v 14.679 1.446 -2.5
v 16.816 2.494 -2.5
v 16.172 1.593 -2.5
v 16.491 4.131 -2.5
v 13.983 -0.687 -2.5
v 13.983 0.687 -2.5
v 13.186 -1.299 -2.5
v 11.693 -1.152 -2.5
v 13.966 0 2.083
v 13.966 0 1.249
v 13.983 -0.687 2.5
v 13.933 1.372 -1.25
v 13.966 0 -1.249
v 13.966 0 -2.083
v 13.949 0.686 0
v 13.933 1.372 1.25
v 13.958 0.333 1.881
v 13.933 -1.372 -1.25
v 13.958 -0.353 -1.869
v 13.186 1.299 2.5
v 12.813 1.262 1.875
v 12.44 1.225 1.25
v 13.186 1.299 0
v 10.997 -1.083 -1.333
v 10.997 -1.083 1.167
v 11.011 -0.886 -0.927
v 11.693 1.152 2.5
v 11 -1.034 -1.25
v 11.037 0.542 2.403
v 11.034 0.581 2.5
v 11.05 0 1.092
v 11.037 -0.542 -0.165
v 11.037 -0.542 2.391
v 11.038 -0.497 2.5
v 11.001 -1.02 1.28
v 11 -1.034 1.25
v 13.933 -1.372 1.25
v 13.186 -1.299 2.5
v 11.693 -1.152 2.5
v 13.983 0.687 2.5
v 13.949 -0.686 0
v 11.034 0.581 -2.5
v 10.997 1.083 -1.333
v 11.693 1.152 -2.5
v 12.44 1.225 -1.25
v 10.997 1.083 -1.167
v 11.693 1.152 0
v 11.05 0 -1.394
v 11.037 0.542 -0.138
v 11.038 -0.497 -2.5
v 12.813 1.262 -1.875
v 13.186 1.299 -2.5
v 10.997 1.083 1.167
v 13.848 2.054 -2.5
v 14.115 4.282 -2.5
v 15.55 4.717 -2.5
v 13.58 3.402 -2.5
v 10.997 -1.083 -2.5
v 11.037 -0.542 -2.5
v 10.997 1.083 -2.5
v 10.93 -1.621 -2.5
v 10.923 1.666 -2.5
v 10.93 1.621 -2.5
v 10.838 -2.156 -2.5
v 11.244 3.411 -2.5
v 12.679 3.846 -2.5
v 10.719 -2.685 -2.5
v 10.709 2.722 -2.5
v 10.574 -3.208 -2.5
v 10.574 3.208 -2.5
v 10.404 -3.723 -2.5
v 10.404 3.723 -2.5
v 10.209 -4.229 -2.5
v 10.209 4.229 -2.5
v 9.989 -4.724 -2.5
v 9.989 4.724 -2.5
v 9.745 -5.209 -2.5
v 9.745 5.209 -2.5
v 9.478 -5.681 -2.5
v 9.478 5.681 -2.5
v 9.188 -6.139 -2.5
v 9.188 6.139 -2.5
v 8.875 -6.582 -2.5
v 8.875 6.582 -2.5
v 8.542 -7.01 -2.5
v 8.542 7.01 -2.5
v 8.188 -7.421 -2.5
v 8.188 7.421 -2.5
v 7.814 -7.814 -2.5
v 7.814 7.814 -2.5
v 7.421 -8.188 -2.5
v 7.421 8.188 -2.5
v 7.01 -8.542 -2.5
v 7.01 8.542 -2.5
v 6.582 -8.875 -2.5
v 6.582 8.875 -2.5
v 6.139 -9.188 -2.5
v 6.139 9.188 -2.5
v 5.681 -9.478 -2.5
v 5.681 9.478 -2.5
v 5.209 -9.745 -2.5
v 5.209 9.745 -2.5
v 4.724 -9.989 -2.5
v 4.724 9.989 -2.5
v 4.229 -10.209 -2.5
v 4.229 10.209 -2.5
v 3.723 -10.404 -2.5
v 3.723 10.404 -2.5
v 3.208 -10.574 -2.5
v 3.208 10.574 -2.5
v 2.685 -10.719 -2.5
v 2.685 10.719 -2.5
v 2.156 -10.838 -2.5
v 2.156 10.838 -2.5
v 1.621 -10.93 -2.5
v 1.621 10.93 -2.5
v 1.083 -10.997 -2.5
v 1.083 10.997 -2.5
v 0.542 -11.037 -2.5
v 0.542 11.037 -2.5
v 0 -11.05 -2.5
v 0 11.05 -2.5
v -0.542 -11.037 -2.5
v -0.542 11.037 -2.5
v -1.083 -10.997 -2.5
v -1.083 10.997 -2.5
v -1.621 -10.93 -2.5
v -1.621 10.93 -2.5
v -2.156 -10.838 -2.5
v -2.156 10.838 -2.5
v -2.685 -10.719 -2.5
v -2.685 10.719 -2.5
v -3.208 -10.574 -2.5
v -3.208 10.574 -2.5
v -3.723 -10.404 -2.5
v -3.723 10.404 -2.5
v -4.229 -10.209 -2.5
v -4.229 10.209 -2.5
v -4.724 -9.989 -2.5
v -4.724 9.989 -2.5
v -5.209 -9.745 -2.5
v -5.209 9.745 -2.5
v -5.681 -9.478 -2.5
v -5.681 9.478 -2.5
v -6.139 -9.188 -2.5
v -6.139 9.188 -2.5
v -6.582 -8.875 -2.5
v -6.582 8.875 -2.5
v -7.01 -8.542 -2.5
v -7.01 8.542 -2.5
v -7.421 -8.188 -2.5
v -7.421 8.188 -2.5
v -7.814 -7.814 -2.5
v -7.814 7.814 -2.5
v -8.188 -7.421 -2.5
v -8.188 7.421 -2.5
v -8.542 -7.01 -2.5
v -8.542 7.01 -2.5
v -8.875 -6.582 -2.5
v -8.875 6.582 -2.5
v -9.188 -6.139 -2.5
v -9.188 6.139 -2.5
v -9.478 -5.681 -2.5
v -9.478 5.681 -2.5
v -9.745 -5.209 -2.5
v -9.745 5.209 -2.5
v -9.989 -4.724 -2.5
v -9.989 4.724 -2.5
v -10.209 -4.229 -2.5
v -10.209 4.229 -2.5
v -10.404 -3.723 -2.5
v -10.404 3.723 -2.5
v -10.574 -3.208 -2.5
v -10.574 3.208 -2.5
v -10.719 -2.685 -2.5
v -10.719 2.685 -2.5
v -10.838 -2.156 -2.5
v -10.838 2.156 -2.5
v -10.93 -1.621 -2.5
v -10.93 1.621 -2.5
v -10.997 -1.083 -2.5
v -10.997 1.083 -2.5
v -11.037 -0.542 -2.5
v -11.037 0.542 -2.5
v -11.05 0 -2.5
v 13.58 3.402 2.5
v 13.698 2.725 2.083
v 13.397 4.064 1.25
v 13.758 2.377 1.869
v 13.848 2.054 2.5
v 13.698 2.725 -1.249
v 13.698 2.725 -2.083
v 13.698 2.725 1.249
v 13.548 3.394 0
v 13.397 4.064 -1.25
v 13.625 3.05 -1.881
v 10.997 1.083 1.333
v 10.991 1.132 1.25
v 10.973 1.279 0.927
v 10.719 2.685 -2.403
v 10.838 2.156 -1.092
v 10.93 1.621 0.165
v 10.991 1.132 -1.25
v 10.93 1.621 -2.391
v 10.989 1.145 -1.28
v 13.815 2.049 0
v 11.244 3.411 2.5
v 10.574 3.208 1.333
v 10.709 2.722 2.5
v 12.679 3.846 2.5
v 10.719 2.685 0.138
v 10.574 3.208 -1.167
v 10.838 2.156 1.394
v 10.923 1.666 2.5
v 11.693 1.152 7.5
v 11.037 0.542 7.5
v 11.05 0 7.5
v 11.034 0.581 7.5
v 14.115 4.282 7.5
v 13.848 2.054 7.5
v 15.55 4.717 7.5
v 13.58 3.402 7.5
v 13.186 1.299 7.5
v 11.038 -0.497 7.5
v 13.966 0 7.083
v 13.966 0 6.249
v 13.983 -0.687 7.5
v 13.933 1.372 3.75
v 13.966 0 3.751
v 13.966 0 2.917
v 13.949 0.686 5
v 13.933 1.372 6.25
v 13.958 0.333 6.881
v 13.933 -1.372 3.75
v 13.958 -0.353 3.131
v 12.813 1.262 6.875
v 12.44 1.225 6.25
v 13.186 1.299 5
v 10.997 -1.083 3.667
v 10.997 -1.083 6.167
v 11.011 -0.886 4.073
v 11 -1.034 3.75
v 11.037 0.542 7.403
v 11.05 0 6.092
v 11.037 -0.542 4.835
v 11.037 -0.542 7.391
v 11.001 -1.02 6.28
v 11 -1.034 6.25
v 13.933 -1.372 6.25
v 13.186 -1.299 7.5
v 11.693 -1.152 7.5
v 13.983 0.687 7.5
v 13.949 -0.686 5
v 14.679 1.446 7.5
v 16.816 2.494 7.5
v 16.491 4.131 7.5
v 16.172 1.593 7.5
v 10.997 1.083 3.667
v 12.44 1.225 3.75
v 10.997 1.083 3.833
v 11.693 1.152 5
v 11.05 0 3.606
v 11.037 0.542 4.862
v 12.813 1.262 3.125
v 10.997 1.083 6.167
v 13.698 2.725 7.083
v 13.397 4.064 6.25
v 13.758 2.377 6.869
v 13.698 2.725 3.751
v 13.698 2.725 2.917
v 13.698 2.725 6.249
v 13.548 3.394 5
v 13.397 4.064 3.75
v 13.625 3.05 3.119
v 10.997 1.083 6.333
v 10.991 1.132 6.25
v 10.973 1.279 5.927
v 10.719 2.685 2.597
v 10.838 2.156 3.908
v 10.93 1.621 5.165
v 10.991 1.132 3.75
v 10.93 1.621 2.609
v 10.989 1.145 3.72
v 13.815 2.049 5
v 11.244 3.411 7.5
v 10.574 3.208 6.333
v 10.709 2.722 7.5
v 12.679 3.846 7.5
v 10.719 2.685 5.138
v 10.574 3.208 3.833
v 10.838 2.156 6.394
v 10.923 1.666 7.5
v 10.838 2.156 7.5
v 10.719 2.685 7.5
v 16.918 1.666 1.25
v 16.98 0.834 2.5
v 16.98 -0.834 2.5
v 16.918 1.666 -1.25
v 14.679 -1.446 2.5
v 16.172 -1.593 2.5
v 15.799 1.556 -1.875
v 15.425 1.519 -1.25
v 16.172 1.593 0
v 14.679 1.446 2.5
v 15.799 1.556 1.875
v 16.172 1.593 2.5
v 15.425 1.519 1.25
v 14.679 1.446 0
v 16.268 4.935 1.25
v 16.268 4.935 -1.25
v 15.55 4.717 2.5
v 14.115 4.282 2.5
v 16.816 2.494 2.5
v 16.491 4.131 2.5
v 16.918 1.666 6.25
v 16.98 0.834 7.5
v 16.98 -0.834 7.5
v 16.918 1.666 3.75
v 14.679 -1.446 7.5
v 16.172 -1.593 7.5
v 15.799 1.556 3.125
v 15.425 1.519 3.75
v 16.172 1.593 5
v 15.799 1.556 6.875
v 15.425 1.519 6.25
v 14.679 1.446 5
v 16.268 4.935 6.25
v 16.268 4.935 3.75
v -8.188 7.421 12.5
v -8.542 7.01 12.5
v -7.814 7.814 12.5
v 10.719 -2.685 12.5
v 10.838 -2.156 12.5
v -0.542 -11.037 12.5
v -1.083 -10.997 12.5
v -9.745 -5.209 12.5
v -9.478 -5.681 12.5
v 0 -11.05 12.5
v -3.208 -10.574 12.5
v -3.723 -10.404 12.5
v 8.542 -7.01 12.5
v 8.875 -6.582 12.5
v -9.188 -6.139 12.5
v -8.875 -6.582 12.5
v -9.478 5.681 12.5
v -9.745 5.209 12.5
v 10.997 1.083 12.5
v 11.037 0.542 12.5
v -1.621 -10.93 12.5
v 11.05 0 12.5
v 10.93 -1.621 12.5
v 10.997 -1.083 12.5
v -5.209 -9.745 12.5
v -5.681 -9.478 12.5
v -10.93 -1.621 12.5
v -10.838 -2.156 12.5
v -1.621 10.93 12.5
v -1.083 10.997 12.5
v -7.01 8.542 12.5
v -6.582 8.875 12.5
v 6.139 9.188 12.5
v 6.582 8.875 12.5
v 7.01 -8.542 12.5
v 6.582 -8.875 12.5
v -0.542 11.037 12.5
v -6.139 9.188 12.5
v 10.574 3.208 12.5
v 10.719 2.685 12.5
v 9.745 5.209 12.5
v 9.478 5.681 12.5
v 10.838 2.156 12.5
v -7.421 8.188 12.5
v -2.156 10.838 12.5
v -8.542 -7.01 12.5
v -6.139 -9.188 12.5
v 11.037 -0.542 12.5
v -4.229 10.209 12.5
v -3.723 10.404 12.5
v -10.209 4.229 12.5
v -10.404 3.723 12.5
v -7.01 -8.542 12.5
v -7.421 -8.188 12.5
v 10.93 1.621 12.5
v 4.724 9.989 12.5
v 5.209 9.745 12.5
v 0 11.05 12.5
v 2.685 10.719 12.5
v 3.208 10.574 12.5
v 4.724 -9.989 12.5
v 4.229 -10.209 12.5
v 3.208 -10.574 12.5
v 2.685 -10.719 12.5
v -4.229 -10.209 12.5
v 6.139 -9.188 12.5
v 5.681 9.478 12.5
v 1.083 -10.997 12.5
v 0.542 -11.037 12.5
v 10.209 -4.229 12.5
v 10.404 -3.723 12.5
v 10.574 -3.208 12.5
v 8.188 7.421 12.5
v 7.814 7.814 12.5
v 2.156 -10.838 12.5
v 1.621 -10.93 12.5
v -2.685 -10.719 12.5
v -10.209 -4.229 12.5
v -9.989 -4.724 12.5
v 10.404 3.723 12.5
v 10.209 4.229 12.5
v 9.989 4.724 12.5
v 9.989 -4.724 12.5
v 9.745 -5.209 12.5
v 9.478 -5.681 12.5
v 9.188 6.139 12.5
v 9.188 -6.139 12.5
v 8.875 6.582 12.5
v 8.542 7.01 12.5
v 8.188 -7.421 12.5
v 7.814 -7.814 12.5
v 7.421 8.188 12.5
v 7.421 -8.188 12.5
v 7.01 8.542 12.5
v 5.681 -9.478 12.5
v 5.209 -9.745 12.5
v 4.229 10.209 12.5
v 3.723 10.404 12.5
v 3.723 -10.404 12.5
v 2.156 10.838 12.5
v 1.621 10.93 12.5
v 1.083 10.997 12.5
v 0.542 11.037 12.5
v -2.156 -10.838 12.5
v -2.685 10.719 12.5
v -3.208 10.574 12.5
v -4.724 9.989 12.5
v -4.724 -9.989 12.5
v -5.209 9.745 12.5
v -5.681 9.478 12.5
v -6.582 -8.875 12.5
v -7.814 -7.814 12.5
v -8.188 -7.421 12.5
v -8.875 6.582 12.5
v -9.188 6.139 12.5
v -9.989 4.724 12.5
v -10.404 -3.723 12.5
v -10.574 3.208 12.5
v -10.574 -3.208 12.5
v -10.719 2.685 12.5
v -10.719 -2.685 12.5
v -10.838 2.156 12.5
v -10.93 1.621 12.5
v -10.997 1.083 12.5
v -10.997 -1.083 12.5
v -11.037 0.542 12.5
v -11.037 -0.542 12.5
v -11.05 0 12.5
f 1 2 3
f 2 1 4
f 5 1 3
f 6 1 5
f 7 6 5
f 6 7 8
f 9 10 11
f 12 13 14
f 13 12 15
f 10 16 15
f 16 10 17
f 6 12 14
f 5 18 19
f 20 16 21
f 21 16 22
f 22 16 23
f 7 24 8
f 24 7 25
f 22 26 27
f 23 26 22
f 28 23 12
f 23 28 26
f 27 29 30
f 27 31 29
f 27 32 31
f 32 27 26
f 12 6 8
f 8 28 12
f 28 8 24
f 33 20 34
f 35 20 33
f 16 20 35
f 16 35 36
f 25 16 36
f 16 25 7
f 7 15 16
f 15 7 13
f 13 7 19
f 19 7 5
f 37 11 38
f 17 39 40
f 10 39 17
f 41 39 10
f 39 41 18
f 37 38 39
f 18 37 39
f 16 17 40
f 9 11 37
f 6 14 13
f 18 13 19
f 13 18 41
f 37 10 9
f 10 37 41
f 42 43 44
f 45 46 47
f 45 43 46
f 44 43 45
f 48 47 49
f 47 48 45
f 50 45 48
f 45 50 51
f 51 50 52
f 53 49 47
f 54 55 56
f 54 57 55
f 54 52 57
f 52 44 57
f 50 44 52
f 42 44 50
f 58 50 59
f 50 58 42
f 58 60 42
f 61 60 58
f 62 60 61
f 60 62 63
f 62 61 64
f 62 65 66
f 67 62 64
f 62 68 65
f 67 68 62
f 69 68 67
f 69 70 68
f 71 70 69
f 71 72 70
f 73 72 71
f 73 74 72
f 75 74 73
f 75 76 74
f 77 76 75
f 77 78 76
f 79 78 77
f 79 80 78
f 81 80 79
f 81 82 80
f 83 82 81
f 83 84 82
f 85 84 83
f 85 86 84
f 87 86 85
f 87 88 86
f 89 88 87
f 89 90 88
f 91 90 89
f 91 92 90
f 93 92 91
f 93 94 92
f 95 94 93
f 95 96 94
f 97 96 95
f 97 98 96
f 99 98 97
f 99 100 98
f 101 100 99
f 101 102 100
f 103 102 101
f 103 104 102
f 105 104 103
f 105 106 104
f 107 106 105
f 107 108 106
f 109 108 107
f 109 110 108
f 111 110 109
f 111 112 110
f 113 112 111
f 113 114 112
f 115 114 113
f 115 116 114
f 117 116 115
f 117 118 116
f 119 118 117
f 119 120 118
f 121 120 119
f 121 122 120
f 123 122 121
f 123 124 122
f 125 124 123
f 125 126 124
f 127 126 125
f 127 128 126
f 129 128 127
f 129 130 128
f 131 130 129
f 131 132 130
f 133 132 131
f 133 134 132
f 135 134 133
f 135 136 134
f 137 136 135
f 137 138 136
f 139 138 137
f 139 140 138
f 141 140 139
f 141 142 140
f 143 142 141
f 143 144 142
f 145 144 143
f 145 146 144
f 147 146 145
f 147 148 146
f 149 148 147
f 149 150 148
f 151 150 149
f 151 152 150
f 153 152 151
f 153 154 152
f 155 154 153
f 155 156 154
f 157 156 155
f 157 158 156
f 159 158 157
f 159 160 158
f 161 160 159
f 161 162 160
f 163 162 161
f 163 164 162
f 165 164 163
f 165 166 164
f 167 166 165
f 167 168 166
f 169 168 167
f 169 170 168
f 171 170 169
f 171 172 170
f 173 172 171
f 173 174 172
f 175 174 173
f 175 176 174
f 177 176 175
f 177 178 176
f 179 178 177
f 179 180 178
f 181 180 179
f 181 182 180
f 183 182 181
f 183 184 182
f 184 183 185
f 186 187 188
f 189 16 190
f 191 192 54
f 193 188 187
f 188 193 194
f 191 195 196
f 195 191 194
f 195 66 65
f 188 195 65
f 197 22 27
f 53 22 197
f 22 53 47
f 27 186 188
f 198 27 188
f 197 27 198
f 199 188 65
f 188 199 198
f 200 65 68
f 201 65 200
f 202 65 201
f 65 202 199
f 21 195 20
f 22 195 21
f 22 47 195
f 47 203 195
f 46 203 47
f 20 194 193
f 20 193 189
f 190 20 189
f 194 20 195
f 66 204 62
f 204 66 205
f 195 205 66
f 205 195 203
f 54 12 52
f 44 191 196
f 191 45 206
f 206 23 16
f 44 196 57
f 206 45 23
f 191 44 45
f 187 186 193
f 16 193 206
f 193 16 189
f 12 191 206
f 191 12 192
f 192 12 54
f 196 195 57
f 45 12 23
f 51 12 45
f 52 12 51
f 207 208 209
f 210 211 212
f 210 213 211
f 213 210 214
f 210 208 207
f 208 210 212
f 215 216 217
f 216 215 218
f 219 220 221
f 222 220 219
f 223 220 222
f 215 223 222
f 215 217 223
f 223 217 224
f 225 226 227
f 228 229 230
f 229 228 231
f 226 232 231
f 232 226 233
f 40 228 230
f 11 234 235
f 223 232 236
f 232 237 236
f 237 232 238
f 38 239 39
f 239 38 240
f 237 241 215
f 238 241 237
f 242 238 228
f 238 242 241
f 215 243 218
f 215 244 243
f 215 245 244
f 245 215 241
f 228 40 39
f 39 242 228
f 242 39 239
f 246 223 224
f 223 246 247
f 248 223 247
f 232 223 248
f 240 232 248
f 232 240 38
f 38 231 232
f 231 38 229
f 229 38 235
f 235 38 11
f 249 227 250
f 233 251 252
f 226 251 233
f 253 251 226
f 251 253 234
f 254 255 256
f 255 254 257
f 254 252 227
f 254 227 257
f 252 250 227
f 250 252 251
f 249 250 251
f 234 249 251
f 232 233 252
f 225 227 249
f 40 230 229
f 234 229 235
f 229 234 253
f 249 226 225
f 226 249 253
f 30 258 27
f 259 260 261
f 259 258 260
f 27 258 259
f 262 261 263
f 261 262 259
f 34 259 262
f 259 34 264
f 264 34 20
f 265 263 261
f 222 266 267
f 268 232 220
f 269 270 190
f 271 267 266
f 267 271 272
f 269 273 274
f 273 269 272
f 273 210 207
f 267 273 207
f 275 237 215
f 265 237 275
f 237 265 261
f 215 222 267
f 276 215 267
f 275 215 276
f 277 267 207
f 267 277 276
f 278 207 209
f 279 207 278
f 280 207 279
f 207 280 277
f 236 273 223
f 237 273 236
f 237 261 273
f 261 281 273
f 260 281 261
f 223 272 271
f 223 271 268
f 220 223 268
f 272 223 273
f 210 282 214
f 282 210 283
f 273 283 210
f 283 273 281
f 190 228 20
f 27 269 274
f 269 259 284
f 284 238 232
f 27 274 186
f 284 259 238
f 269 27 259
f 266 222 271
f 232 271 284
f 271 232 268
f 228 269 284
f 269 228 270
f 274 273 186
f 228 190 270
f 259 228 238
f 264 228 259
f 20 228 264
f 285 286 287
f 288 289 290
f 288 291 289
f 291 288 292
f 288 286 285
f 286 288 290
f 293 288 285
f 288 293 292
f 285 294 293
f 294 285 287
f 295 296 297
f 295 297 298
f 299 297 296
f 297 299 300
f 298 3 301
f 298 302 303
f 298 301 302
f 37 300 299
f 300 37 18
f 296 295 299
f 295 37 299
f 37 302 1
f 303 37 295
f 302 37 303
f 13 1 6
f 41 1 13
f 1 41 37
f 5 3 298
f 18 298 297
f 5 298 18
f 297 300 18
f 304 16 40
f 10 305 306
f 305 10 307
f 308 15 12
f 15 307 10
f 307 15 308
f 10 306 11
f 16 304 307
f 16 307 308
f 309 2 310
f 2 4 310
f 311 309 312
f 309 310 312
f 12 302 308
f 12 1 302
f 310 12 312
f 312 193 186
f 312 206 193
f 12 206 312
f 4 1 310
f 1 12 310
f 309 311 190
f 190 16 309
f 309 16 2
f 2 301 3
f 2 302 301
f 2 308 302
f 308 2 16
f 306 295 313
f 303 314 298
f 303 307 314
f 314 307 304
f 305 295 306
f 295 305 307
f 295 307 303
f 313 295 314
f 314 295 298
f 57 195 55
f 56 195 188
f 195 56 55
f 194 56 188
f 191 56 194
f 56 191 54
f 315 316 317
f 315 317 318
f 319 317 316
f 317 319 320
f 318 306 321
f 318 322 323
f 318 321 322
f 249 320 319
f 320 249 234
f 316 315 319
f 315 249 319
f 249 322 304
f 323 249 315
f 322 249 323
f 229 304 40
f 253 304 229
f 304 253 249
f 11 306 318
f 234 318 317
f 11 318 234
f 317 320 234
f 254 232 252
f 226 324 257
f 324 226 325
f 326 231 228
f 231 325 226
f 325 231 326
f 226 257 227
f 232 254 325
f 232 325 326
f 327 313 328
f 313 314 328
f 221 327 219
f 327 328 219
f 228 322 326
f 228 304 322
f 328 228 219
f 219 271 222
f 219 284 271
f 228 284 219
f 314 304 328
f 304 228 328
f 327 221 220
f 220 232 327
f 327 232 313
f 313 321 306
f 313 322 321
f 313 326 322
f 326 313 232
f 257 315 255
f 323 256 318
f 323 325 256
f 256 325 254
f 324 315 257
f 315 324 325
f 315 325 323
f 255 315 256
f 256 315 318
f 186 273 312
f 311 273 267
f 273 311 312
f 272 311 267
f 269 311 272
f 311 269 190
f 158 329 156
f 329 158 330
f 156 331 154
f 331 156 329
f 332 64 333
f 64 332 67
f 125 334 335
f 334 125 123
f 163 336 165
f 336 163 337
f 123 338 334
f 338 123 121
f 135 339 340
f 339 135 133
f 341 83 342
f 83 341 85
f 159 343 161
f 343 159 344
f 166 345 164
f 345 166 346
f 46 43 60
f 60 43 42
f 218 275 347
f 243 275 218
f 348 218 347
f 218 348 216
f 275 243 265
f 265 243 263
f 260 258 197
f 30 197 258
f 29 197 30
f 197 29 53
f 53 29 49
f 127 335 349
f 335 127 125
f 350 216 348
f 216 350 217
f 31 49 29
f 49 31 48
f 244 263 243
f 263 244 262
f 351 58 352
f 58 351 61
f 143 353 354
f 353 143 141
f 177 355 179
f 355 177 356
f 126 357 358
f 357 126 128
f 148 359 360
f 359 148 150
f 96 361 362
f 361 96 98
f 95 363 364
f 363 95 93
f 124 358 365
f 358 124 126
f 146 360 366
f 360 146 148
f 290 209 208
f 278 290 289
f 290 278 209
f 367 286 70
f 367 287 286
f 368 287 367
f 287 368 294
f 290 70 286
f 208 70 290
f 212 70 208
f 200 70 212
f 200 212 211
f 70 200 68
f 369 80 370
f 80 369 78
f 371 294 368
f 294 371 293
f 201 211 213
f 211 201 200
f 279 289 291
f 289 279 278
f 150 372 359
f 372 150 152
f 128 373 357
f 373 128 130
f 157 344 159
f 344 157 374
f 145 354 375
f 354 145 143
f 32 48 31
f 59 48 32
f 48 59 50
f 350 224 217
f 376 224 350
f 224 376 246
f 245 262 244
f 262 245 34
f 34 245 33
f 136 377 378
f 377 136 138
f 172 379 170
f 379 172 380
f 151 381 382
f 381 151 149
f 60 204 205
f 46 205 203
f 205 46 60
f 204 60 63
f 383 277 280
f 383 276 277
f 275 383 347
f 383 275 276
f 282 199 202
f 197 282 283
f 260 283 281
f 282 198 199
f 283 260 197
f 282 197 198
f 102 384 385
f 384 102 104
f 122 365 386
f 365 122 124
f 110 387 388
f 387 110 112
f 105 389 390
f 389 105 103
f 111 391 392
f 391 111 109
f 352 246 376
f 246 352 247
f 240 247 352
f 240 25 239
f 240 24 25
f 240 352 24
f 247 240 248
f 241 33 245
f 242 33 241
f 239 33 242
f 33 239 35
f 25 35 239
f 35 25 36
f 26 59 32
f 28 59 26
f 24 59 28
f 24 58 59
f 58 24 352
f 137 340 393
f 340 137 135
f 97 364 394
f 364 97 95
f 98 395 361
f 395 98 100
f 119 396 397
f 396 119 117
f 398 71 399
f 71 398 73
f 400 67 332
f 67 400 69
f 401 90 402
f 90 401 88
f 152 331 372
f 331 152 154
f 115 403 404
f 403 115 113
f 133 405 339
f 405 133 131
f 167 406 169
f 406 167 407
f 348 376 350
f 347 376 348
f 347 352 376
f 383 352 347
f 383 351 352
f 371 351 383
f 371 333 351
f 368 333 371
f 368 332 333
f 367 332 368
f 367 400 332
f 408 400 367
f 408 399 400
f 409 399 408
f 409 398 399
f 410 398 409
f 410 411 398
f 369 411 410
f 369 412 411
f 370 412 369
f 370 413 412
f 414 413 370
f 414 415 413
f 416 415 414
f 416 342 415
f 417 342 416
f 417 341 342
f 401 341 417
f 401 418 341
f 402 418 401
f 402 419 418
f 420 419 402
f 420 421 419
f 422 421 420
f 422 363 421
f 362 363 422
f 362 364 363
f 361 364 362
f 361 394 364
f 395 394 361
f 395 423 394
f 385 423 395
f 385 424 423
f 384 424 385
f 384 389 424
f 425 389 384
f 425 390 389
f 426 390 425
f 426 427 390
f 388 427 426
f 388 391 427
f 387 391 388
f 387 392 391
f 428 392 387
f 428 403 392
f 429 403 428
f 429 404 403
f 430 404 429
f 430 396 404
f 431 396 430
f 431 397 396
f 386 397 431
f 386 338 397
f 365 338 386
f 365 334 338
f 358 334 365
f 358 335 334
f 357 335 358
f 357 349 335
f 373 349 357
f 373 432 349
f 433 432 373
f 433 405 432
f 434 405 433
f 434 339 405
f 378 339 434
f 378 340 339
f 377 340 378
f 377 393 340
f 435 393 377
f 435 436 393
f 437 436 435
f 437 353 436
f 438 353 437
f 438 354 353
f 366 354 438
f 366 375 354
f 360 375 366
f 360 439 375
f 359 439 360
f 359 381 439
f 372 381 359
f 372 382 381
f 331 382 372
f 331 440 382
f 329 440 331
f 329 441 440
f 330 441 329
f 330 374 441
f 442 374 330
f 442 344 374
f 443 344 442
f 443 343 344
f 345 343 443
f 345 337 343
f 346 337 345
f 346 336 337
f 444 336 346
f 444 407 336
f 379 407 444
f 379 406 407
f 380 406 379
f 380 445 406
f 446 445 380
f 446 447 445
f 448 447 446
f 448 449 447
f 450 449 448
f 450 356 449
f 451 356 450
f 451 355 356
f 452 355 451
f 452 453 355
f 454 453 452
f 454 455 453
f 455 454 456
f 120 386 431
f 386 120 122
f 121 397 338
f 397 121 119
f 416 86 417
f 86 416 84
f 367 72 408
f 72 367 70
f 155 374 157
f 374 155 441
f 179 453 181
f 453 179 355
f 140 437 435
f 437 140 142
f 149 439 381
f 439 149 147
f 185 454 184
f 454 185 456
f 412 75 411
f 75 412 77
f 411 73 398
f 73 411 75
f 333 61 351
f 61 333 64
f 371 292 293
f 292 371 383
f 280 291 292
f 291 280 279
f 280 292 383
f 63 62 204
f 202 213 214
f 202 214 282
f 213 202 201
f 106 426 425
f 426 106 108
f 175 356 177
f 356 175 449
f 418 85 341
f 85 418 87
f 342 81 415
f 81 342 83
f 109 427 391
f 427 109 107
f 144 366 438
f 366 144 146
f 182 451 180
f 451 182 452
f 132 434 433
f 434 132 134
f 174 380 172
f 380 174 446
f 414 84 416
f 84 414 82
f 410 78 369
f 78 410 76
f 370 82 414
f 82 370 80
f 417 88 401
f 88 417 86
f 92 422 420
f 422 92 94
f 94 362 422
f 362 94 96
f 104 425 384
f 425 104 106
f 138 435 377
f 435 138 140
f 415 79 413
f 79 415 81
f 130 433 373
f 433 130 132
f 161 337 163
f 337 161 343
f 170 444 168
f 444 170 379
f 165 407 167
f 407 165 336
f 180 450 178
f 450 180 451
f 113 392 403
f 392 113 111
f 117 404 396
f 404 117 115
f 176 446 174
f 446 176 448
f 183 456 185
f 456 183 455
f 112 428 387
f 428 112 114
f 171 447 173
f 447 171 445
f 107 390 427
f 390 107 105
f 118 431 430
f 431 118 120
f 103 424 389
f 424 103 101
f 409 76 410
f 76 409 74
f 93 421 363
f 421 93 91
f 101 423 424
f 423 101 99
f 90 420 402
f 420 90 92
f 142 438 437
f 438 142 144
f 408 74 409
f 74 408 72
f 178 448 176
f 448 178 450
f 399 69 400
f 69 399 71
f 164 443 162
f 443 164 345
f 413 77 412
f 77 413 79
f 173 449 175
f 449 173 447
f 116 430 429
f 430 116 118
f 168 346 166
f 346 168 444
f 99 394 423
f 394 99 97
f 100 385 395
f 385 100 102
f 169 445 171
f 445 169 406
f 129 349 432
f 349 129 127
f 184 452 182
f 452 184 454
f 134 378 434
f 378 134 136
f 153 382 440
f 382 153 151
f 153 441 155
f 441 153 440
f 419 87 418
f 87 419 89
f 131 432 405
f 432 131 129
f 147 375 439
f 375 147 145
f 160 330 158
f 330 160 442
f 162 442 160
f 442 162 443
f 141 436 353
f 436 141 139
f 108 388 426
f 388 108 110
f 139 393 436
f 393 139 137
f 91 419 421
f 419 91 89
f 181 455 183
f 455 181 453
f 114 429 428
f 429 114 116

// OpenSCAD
//Reimplementation of Hatch Flow pattern for OpenSCAD
//Generalized for multiple layers of depth
//Added regularity as an alternative to randomness

nhor=32;
nvert=3;
hvert=15;
ndepth=2;
od=34;
id=22; 

module element(f,od,id,h,rotated=false) {
  assert(!is_undef(f));
  assert(!is_undef(od));
  assert(!is_undef(id));
  assert(!is_undef(h));
  assert(!is_undef(rotated));
  mp=(od+id)/4;
  q=(od-id)/8;
  p1=[[-1,-2,-2],[1,-2,-2],[2,-1,-2],[2,1,-2], //z=-2
     [-2,1,2],[-2,-1,2],[-2,-2,1],[-2,-2,-1], //x=-2
     [1,2,2],[-1,2,2],[2,2,-1],[2,2,1]];//y=2
  p2=[[1,-2,2],[2,-2,1],[2,-1,2],[-1,-2,2],[2,-2,-1],[2,1,2]];
  p3=[[-1,2,-2],[-2,2,-1],[-2,1,-2],[1,2,-2],[-2,2,1],[-2,-1,-2]];
  function rot(pts)= [for (p=pts) [p[2],p[1],-p[0]]];
  function bend(pts,mp,q,f) =[for (p=pts) [(mp+q*p[0])*cos(p[1]*90/f),(mp+q*p[0])*sin(p[1]*90/f),h*p[2]/4]];
  polyhedron(points=bend(rotated?rot(p1):p1,mp,q,f),
              faces=[[0,1,2,3], [9,8,5,4], //same z
                     [4,5,6,7], [11,10,3,2], //same x
                     [8,9,10,11], [7,6,1,0], //same y
                     [0,3,10,9,4,7], [2,1,6,5,8,11]]);
  polyhedron(points=bend(rotated?rot(p2):p2,mp,q,f),
              faces=[[0,2,1],[3,4,5],[0,3,5,2],[0,1,4,3],[1,2,5,4]]);
  polyhedron(points=bend(rotated?rot(p3):p3,mp,q,f),
              faces=[[0,1,2],[3,5,4],[2,5,3,0],[3,4,1,0],[4,5,2,1]]);
} 

module ring(nhor=16,nvert=3,hvert=6,ndepth=1,od=60,id=50) {
  randoms=rands(0,2,nhor*nvert*ndepth);
  //rotations=[for (r=randoms) r>1]; 
  //rotations=[for (i=[0:1:nhor*nvert*ndepth]) i%2==0 ];
  //rotations=[for (i=[0:1:nhor*nvert*ndepth-1]) i%3==0 ];
  rotations=[for (i=[0:1:nhor*nvert*ndepth-1]) i%5>2 ];
  echo(rotations);
  p=[for (k=[id:(od-id)/ndepth:od-(od-id)/ndepth])
      for (j=[0:hvert/nvert:hvert*(1-1/nvert)])
        for (i=[0:360/nhor:360-360/nhor])
          [i,j,nhor,k+(od-id)/ndepth,k,hvert/nvert]];
  for (i=[0:1:nhor*nvert*ndepth-1])
    rotate([0,0,p[i][0]]) translate([0,0,p[i][1]]) element(p[i][2],p[i][3],p[i][4],p[i][5],rotations[i]);
  translate([0,0,-hvert/(2*nvert)])cylinder(h=hvert,d=id+0.1,$fn=nhor*4);
}

module test_tile(nhor=16,nvert=3,hvert=6,ndepth=1,od=60,id=50) {
  randoms=rands(0,2,nhor*nvert*ndepth);
  //rotations=[for (r=randoms) r>1]; 
  //rotations=[for (i=[0:1:nhor*nvert*ndepth]) i%2==0 ];
  //rotations=[for (i=[0:1:nhor*nvert*ndepth-1]) i%3==0 ];
  //rotations=[for (i=[0:1:nhor*nvert*ndepth-1]) i%5>2 ];
  //rotations=[false,false,false,false,false,false,false,false];
  rotations=[false,true,false,true,true,false,true,false];
  echo(rotations);
  p=[for (k=[id,id+(od-id)/ndepth])
      for (j=[0,hvert/nvert])
        for (i=[0,360/nhor-0.00001])
          [i,j,nhor,k+(od-id)/ndepth,k,hvert/nvert]];
  for (i=[0:1:7])
    rotate([0,0,p[i][0]]) translate([0,0,p[i][1]]) element(p[i][2],p[i][3],p[i][4],p[i][5],rotations[i]);
  translate([0,0,-hvert/(2*nvert)])cylinder(h=hvert,d=id+0.1,$fn=nhor*4);
}

//ring(nhor=nhor,nvert=nvert,hvert=hvert,ndepth=ndepth,od=od,id=id);
test_tile(nhor=nhor,nvert=nvert,hvert=hvert,ndepth=ndepth,od=od,id=id);


/* Following code is not used in the model, but was used during development. But can still be useful for understanding, since it does not have polyhedron() calls with low-level vertex manipulations. unit() generates basically same building block as element(), just not bent, therefore consisting only of three intersections of cuboid pairs. pattern() builds small wall out of those blocks to see how they can be stacked.
x=2.0;
appr=5;
y=x*sqrt(12);

module unit(x=5,y=5*sqrt(12)) { //for generating straight non-cylindrical patterns. Used during developnment
  intersection(){
    rotate([atan(sqrt(2)),0,45])cube([appr*x,appr*x,x],center=true);
    cube([y,y,y],center=true);
  }
  intersection(){
    rotate([atan(sqrt(2)),0,45])translate([0,0,2*x])cube([appr*x,appr*x,x],center=true);
    cube([y,y,y],center=true);
  }
  intersection(){
    rotate([atan(sqrt(2)),0,45])translate([0,0,-2*x])cube([appr*x,appr*x,x],center=true);
    cube([y,y,y],center=true);
  }
}
module pattern() { // straight non-cylindrical wall with this pattern. Used during development
  t=[for (i=[1:4]) for (j=[1:4]) [0,i*y,j*y]];
  for (trans=t) translate(trans) rotate([0,rands(0,2,1)[0]>1?90:0,0]) unit(x,y);  
}
pattern();
*/
